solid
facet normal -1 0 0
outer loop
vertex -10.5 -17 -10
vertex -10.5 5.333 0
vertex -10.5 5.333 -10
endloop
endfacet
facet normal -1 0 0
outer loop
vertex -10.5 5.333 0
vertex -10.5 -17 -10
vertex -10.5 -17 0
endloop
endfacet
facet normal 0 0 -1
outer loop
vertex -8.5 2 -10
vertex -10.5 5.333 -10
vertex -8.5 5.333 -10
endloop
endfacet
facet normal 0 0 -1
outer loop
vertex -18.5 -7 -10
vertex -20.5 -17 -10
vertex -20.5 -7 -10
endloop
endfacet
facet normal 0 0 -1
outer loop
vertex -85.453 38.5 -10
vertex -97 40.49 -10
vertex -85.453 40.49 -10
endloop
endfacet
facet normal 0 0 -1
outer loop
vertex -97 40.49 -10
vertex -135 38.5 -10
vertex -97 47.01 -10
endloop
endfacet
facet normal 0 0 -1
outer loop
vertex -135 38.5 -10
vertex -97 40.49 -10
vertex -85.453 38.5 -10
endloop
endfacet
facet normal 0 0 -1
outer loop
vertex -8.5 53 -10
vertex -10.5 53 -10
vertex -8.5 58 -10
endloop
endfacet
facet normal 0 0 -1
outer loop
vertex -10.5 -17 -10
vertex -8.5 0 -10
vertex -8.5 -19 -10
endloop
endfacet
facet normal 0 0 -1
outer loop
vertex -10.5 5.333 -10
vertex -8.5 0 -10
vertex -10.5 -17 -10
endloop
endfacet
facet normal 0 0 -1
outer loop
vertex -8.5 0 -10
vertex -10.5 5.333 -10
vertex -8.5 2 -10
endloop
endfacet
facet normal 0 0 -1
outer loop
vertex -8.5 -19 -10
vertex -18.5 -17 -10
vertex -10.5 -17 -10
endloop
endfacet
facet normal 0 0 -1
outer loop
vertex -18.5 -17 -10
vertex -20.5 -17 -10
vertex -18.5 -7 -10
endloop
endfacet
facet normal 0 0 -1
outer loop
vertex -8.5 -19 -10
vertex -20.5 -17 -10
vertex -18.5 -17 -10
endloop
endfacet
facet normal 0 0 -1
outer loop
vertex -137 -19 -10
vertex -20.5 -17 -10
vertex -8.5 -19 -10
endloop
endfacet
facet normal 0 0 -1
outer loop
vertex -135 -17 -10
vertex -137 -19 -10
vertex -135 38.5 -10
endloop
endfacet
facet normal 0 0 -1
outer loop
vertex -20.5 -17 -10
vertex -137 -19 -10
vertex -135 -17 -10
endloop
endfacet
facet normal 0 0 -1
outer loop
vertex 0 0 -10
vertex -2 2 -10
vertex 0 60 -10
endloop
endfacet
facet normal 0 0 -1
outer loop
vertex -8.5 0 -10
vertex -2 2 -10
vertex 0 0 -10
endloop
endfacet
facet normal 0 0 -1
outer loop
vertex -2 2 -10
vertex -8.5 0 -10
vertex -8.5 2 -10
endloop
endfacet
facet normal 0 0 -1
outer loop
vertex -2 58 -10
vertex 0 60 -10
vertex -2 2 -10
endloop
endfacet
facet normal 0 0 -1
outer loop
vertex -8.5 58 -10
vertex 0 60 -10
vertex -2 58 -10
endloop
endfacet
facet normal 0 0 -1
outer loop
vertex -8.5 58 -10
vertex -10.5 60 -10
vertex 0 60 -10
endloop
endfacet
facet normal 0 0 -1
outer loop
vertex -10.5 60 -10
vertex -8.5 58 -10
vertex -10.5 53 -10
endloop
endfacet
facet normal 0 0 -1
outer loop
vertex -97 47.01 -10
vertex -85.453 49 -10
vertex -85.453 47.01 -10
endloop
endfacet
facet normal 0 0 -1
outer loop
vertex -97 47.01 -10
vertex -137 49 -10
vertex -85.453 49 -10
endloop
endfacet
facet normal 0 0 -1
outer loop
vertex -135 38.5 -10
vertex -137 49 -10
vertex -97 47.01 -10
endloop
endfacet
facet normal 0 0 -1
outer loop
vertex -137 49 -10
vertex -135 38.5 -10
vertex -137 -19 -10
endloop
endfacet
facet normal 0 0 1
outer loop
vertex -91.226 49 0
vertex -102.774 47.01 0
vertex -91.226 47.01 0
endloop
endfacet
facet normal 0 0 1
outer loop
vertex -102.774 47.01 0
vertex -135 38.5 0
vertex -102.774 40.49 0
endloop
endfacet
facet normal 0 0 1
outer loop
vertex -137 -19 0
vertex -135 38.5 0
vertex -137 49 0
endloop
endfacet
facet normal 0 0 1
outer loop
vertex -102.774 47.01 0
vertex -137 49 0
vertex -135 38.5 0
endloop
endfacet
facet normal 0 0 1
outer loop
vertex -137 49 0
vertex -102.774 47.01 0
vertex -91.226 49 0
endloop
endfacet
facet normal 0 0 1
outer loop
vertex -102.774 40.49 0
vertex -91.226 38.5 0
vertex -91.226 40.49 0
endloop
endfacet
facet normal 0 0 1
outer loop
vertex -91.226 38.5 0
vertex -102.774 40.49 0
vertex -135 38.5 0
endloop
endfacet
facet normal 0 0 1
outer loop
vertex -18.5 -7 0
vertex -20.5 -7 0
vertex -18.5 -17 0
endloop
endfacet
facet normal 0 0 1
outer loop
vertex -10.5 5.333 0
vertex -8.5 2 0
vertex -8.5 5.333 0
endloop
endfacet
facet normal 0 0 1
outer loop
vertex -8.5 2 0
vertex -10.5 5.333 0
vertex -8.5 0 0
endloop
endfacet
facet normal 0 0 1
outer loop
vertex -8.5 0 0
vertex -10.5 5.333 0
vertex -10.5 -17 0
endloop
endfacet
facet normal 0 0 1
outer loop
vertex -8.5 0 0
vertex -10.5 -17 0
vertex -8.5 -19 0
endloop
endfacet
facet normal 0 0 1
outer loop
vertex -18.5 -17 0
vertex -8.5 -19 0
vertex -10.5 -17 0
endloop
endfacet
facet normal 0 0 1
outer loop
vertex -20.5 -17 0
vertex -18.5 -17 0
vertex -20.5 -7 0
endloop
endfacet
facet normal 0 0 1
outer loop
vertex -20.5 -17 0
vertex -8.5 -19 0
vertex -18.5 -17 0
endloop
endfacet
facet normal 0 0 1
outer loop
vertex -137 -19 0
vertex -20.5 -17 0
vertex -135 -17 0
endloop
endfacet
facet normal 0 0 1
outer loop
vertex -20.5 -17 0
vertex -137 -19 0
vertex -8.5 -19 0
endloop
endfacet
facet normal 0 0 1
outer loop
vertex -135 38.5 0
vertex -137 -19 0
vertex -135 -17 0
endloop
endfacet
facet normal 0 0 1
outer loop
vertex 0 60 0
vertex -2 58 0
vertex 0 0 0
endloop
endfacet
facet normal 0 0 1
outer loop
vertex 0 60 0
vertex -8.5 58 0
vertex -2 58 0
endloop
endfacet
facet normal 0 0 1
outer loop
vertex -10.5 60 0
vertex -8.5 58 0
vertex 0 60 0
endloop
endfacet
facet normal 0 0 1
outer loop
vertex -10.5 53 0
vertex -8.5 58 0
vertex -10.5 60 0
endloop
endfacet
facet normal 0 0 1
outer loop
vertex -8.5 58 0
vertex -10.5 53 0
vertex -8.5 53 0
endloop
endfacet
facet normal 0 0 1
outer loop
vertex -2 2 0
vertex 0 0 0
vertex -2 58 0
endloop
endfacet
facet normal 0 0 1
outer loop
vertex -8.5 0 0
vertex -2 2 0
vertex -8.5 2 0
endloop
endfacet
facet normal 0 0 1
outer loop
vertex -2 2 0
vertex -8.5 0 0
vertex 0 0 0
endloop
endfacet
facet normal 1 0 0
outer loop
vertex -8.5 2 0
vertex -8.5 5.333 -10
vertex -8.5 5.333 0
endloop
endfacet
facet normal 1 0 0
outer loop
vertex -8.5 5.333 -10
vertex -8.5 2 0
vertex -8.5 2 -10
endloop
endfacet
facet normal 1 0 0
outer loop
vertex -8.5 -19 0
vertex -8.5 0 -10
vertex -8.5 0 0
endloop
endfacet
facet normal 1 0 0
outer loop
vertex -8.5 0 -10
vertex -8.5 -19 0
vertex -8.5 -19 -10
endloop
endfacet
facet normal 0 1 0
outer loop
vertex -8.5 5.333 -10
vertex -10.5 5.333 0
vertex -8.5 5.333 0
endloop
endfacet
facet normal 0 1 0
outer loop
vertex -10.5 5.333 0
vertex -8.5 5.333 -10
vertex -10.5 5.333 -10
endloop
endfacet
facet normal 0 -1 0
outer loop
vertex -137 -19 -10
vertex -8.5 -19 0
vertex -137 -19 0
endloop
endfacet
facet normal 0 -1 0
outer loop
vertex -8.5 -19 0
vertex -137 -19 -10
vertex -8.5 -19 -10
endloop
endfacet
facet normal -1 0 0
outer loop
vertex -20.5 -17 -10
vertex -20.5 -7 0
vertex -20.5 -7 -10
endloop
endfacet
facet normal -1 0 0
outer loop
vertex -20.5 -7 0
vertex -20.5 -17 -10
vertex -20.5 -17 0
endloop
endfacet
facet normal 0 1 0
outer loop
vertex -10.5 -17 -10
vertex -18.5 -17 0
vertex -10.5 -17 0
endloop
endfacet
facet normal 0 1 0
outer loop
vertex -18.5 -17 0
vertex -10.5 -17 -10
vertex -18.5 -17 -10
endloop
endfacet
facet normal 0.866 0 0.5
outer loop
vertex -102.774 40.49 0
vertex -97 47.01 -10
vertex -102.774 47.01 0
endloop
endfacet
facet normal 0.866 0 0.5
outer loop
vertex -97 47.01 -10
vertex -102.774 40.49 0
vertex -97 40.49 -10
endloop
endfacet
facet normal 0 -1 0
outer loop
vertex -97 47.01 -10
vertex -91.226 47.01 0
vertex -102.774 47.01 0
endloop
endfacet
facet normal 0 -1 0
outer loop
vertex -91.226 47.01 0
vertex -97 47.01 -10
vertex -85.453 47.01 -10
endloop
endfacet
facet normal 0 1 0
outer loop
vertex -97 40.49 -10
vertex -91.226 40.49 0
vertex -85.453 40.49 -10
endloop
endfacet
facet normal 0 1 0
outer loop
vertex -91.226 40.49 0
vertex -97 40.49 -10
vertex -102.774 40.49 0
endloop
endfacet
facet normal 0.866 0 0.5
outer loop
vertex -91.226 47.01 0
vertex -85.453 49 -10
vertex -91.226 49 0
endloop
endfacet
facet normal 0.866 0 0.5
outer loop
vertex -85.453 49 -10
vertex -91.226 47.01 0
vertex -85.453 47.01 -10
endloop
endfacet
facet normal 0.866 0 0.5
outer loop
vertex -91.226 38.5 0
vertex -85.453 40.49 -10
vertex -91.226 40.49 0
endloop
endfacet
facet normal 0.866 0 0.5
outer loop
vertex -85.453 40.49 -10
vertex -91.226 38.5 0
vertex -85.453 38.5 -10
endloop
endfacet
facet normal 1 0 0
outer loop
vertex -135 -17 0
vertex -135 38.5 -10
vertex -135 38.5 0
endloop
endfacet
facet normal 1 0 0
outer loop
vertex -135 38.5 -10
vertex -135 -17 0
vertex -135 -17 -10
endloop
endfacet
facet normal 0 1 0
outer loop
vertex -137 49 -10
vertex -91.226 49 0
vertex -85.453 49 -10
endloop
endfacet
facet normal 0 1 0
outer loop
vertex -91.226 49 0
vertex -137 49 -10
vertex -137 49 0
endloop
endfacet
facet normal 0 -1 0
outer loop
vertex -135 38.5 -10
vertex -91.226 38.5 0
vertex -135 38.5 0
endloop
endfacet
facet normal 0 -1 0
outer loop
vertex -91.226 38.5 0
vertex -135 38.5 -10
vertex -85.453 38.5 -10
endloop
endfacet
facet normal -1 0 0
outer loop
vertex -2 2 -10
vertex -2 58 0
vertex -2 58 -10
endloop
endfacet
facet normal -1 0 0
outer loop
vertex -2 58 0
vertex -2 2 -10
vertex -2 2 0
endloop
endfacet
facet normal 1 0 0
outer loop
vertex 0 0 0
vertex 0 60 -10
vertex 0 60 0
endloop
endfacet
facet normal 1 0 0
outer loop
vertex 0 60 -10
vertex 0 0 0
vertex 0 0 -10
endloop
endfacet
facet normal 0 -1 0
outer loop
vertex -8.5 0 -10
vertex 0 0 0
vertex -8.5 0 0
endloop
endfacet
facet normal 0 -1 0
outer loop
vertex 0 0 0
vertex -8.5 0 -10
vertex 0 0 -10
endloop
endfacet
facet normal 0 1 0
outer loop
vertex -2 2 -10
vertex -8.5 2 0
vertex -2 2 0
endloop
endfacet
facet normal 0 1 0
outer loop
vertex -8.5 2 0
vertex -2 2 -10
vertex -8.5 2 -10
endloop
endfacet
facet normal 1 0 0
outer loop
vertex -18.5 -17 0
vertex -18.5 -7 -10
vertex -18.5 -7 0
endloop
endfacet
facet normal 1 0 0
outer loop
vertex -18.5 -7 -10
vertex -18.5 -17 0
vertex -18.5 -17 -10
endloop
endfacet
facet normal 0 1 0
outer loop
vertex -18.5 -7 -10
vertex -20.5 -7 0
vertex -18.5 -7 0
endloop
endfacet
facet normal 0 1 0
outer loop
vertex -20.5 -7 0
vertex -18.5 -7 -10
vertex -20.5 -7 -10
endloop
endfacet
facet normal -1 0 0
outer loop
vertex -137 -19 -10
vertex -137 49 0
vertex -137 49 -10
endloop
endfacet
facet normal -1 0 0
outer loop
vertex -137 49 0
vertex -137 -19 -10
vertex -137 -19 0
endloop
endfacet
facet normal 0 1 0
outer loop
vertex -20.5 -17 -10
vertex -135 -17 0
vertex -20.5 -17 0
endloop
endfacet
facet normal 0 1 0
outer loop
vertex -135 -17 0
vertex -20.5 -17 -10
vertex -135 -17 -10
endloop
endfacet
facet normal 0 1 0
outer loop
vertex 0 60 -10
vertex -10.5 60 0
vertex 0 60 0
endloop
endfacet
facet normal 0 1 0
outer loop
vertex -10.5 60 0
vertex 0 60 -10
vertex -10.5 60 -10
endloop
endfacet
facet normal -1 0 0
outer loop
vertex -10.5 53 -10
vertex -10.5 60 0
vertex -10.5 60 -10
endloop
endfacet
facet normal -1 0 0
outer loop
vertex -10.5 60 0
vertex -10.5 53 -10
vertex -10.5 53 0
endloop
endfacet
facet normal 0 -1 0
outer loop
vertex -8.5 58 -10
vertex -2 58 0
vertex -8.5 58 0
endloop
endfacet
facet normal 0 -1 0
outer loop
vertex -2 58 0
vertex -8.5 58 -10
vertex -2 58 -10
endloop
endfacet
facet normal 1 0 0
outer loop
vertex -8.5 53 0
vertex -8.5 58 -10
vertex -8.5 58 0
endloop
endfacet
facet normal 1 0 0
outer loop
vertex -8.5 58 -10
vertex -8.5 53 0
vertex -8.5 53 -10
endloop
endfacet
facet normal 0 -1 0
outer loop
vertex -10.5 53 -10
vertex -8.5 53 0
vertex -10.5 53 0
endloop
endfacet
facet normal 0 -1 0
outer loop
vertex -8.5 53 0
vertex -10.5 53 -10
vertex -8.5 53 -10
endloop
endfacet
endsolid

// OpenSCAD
//--------------------------------------------------------------------//
// Prusa i3 power box clip                                            //
//--------------------------------------------------------------------//
// Author        : Patrick Henry                                      //
// Email         : phenry@pontetec.com                                //
// License       : MIT - http://opensource.org/licenses/MIT           //
//--------------------------------------------------------------------//
// The 12V power supply has a few shallow screw holes in its base,
// and the acrylic frame has some holes also. Unfortunately, these
// don't really line up except at one end.
//
// So I have the power supply bolted on to the right side of the
// printer, with the wires coming out the bottom, and two M3 bolts
// holding it in place. Since the screw holes are so shallow, I had
// to use washers and nuts to make my M3 bolts short enough that it
// is held securely (shorter bolts would also be an option) and then
// to keep the top in place I printed this clip. The clip is shown
// upside down here, to make the slope easier to print.
//
// The clip is implemented in two modules, to allow two variants.
// If you want a complete clip that wraps around the acrylic at the
// front of the frame, make sure to use clip_complete(). However,
// to snap this on requires some finesse, so by commenting out the
// call to that module you can get a clip that doesn't wrap around.
//--------------------------------------------------------------------//

//--------------------------------------------------------------------//
// Useful constants                                                   //
//--------------------------------------------------------------------//

eps = 0.01;
wall = 2;
acrylic = 6.5;
surround = wall + acrylic + wall;
over = wall + acrylic;
overhang = 10;
box_dx = 114.5;
box_dy  = 50;
box_dy2 = 14;
box_x  = 12;
box_y = -19;
dz = 10;
dx = 20;
blob_x = 20+28;

//--------------------------------------------------------------------//
// Module: clip for power box                                         //
//--------------------------------------------------------------------//

module clip() {
  cube([wall, wall + overhang, dz]);
  cube([surround, wall, dz]);
  
  translate([over,0,0])
  {
    cube([wall, box_y + wall, dz]);
  }
  
  translate([over, box_y, 0])
  {
    cube([wall, wall-box_y+overhang / 3, dz]);
    cube([box_x, wall, dz]);
  }
  translate([acrylic + box_x, box_y, 0])
  {
    cube([wall, wall + overhang, dz]);
  }
  translate([over + box_x, box_y, 0])
  {
    cube([box_dx + wall, wall, dz]);
  }
  translate([over + box_x + box_dx, box_y, 0])
  {
    cube([wall, wall + box_dy + box_dy2 + wall, dz]);
  }
  difference() {
    translate([over + box_x + box_dx - blob_x-5, box_y + box_dy + box_dy2 - acrylic, 0])
    {
      cube([blob_x+5, surround, dz]);
    }
    translate([over + box_x + box_dx - blob_x + overhang, box_y + box_dy + box_dy2 + wall - acrylic, dz])
      rotate([0,150,0])
      {
        translate([0, -eps, -dz*11])
        {
          cube([overhang * 2, acrylic+2*eps, dz * 20]);
        }
        translate([overhang, -wall-eps, -dz*11])
        {
          cube([overhang, surround+2*eps, dz * 20]);
        }
      }
  }
}

//--------------------------------------------------------------------//
// Module: clip_complete adds a locking part at the front.            //
//--------------------------------------------------------------------//

module clip_complete() {
  cube([wall, 56 + wall * 2, dz]);
  translate([0, 56 + wall, 0])
    cube([acrylic + 2 * wall, wall, dz]);
  translate([acrylic + wall, 56 + wall - overhang / 2, 0])
    cube([wall, overhang / 2 + wall, dz]);
}

//--------------------------------------------------------------------//
// Module: powerbox shows a small slice of the power supply           //
//--------------------------------------------------------------------//

module powerbox() {
  color([1,0,0])
    translate([over + box_x, box_y + wall, -100])
      cube([box_dx, box_dy, 120]);
}

//--------------------------------------------------------------------//
// Module: frame shows the acrylic frame                              //
//--------------------------------------------------------------------//

module frame() {
  color([.4, .4, .4])
  {
    translate([wall, wall, -100])
      cube([acrylic, 55, 200]);
    translate([wall + acrylic, wall + 45, -100])
    {
      rotate([90,0,0])
        linear_extrude(height = acrylic)
          polygon(points = [ [0, 0], [133, 0], [47, 200], [0, 200] ]);
    }
  }
}

//--------------------------------------------------------------------//
// Main body                                                          //
//--------------------------------------------------------------------//

rotate([0,180,0])
{
  //frame();
  //powerbox();
  clip();
  clip_complete();
}
